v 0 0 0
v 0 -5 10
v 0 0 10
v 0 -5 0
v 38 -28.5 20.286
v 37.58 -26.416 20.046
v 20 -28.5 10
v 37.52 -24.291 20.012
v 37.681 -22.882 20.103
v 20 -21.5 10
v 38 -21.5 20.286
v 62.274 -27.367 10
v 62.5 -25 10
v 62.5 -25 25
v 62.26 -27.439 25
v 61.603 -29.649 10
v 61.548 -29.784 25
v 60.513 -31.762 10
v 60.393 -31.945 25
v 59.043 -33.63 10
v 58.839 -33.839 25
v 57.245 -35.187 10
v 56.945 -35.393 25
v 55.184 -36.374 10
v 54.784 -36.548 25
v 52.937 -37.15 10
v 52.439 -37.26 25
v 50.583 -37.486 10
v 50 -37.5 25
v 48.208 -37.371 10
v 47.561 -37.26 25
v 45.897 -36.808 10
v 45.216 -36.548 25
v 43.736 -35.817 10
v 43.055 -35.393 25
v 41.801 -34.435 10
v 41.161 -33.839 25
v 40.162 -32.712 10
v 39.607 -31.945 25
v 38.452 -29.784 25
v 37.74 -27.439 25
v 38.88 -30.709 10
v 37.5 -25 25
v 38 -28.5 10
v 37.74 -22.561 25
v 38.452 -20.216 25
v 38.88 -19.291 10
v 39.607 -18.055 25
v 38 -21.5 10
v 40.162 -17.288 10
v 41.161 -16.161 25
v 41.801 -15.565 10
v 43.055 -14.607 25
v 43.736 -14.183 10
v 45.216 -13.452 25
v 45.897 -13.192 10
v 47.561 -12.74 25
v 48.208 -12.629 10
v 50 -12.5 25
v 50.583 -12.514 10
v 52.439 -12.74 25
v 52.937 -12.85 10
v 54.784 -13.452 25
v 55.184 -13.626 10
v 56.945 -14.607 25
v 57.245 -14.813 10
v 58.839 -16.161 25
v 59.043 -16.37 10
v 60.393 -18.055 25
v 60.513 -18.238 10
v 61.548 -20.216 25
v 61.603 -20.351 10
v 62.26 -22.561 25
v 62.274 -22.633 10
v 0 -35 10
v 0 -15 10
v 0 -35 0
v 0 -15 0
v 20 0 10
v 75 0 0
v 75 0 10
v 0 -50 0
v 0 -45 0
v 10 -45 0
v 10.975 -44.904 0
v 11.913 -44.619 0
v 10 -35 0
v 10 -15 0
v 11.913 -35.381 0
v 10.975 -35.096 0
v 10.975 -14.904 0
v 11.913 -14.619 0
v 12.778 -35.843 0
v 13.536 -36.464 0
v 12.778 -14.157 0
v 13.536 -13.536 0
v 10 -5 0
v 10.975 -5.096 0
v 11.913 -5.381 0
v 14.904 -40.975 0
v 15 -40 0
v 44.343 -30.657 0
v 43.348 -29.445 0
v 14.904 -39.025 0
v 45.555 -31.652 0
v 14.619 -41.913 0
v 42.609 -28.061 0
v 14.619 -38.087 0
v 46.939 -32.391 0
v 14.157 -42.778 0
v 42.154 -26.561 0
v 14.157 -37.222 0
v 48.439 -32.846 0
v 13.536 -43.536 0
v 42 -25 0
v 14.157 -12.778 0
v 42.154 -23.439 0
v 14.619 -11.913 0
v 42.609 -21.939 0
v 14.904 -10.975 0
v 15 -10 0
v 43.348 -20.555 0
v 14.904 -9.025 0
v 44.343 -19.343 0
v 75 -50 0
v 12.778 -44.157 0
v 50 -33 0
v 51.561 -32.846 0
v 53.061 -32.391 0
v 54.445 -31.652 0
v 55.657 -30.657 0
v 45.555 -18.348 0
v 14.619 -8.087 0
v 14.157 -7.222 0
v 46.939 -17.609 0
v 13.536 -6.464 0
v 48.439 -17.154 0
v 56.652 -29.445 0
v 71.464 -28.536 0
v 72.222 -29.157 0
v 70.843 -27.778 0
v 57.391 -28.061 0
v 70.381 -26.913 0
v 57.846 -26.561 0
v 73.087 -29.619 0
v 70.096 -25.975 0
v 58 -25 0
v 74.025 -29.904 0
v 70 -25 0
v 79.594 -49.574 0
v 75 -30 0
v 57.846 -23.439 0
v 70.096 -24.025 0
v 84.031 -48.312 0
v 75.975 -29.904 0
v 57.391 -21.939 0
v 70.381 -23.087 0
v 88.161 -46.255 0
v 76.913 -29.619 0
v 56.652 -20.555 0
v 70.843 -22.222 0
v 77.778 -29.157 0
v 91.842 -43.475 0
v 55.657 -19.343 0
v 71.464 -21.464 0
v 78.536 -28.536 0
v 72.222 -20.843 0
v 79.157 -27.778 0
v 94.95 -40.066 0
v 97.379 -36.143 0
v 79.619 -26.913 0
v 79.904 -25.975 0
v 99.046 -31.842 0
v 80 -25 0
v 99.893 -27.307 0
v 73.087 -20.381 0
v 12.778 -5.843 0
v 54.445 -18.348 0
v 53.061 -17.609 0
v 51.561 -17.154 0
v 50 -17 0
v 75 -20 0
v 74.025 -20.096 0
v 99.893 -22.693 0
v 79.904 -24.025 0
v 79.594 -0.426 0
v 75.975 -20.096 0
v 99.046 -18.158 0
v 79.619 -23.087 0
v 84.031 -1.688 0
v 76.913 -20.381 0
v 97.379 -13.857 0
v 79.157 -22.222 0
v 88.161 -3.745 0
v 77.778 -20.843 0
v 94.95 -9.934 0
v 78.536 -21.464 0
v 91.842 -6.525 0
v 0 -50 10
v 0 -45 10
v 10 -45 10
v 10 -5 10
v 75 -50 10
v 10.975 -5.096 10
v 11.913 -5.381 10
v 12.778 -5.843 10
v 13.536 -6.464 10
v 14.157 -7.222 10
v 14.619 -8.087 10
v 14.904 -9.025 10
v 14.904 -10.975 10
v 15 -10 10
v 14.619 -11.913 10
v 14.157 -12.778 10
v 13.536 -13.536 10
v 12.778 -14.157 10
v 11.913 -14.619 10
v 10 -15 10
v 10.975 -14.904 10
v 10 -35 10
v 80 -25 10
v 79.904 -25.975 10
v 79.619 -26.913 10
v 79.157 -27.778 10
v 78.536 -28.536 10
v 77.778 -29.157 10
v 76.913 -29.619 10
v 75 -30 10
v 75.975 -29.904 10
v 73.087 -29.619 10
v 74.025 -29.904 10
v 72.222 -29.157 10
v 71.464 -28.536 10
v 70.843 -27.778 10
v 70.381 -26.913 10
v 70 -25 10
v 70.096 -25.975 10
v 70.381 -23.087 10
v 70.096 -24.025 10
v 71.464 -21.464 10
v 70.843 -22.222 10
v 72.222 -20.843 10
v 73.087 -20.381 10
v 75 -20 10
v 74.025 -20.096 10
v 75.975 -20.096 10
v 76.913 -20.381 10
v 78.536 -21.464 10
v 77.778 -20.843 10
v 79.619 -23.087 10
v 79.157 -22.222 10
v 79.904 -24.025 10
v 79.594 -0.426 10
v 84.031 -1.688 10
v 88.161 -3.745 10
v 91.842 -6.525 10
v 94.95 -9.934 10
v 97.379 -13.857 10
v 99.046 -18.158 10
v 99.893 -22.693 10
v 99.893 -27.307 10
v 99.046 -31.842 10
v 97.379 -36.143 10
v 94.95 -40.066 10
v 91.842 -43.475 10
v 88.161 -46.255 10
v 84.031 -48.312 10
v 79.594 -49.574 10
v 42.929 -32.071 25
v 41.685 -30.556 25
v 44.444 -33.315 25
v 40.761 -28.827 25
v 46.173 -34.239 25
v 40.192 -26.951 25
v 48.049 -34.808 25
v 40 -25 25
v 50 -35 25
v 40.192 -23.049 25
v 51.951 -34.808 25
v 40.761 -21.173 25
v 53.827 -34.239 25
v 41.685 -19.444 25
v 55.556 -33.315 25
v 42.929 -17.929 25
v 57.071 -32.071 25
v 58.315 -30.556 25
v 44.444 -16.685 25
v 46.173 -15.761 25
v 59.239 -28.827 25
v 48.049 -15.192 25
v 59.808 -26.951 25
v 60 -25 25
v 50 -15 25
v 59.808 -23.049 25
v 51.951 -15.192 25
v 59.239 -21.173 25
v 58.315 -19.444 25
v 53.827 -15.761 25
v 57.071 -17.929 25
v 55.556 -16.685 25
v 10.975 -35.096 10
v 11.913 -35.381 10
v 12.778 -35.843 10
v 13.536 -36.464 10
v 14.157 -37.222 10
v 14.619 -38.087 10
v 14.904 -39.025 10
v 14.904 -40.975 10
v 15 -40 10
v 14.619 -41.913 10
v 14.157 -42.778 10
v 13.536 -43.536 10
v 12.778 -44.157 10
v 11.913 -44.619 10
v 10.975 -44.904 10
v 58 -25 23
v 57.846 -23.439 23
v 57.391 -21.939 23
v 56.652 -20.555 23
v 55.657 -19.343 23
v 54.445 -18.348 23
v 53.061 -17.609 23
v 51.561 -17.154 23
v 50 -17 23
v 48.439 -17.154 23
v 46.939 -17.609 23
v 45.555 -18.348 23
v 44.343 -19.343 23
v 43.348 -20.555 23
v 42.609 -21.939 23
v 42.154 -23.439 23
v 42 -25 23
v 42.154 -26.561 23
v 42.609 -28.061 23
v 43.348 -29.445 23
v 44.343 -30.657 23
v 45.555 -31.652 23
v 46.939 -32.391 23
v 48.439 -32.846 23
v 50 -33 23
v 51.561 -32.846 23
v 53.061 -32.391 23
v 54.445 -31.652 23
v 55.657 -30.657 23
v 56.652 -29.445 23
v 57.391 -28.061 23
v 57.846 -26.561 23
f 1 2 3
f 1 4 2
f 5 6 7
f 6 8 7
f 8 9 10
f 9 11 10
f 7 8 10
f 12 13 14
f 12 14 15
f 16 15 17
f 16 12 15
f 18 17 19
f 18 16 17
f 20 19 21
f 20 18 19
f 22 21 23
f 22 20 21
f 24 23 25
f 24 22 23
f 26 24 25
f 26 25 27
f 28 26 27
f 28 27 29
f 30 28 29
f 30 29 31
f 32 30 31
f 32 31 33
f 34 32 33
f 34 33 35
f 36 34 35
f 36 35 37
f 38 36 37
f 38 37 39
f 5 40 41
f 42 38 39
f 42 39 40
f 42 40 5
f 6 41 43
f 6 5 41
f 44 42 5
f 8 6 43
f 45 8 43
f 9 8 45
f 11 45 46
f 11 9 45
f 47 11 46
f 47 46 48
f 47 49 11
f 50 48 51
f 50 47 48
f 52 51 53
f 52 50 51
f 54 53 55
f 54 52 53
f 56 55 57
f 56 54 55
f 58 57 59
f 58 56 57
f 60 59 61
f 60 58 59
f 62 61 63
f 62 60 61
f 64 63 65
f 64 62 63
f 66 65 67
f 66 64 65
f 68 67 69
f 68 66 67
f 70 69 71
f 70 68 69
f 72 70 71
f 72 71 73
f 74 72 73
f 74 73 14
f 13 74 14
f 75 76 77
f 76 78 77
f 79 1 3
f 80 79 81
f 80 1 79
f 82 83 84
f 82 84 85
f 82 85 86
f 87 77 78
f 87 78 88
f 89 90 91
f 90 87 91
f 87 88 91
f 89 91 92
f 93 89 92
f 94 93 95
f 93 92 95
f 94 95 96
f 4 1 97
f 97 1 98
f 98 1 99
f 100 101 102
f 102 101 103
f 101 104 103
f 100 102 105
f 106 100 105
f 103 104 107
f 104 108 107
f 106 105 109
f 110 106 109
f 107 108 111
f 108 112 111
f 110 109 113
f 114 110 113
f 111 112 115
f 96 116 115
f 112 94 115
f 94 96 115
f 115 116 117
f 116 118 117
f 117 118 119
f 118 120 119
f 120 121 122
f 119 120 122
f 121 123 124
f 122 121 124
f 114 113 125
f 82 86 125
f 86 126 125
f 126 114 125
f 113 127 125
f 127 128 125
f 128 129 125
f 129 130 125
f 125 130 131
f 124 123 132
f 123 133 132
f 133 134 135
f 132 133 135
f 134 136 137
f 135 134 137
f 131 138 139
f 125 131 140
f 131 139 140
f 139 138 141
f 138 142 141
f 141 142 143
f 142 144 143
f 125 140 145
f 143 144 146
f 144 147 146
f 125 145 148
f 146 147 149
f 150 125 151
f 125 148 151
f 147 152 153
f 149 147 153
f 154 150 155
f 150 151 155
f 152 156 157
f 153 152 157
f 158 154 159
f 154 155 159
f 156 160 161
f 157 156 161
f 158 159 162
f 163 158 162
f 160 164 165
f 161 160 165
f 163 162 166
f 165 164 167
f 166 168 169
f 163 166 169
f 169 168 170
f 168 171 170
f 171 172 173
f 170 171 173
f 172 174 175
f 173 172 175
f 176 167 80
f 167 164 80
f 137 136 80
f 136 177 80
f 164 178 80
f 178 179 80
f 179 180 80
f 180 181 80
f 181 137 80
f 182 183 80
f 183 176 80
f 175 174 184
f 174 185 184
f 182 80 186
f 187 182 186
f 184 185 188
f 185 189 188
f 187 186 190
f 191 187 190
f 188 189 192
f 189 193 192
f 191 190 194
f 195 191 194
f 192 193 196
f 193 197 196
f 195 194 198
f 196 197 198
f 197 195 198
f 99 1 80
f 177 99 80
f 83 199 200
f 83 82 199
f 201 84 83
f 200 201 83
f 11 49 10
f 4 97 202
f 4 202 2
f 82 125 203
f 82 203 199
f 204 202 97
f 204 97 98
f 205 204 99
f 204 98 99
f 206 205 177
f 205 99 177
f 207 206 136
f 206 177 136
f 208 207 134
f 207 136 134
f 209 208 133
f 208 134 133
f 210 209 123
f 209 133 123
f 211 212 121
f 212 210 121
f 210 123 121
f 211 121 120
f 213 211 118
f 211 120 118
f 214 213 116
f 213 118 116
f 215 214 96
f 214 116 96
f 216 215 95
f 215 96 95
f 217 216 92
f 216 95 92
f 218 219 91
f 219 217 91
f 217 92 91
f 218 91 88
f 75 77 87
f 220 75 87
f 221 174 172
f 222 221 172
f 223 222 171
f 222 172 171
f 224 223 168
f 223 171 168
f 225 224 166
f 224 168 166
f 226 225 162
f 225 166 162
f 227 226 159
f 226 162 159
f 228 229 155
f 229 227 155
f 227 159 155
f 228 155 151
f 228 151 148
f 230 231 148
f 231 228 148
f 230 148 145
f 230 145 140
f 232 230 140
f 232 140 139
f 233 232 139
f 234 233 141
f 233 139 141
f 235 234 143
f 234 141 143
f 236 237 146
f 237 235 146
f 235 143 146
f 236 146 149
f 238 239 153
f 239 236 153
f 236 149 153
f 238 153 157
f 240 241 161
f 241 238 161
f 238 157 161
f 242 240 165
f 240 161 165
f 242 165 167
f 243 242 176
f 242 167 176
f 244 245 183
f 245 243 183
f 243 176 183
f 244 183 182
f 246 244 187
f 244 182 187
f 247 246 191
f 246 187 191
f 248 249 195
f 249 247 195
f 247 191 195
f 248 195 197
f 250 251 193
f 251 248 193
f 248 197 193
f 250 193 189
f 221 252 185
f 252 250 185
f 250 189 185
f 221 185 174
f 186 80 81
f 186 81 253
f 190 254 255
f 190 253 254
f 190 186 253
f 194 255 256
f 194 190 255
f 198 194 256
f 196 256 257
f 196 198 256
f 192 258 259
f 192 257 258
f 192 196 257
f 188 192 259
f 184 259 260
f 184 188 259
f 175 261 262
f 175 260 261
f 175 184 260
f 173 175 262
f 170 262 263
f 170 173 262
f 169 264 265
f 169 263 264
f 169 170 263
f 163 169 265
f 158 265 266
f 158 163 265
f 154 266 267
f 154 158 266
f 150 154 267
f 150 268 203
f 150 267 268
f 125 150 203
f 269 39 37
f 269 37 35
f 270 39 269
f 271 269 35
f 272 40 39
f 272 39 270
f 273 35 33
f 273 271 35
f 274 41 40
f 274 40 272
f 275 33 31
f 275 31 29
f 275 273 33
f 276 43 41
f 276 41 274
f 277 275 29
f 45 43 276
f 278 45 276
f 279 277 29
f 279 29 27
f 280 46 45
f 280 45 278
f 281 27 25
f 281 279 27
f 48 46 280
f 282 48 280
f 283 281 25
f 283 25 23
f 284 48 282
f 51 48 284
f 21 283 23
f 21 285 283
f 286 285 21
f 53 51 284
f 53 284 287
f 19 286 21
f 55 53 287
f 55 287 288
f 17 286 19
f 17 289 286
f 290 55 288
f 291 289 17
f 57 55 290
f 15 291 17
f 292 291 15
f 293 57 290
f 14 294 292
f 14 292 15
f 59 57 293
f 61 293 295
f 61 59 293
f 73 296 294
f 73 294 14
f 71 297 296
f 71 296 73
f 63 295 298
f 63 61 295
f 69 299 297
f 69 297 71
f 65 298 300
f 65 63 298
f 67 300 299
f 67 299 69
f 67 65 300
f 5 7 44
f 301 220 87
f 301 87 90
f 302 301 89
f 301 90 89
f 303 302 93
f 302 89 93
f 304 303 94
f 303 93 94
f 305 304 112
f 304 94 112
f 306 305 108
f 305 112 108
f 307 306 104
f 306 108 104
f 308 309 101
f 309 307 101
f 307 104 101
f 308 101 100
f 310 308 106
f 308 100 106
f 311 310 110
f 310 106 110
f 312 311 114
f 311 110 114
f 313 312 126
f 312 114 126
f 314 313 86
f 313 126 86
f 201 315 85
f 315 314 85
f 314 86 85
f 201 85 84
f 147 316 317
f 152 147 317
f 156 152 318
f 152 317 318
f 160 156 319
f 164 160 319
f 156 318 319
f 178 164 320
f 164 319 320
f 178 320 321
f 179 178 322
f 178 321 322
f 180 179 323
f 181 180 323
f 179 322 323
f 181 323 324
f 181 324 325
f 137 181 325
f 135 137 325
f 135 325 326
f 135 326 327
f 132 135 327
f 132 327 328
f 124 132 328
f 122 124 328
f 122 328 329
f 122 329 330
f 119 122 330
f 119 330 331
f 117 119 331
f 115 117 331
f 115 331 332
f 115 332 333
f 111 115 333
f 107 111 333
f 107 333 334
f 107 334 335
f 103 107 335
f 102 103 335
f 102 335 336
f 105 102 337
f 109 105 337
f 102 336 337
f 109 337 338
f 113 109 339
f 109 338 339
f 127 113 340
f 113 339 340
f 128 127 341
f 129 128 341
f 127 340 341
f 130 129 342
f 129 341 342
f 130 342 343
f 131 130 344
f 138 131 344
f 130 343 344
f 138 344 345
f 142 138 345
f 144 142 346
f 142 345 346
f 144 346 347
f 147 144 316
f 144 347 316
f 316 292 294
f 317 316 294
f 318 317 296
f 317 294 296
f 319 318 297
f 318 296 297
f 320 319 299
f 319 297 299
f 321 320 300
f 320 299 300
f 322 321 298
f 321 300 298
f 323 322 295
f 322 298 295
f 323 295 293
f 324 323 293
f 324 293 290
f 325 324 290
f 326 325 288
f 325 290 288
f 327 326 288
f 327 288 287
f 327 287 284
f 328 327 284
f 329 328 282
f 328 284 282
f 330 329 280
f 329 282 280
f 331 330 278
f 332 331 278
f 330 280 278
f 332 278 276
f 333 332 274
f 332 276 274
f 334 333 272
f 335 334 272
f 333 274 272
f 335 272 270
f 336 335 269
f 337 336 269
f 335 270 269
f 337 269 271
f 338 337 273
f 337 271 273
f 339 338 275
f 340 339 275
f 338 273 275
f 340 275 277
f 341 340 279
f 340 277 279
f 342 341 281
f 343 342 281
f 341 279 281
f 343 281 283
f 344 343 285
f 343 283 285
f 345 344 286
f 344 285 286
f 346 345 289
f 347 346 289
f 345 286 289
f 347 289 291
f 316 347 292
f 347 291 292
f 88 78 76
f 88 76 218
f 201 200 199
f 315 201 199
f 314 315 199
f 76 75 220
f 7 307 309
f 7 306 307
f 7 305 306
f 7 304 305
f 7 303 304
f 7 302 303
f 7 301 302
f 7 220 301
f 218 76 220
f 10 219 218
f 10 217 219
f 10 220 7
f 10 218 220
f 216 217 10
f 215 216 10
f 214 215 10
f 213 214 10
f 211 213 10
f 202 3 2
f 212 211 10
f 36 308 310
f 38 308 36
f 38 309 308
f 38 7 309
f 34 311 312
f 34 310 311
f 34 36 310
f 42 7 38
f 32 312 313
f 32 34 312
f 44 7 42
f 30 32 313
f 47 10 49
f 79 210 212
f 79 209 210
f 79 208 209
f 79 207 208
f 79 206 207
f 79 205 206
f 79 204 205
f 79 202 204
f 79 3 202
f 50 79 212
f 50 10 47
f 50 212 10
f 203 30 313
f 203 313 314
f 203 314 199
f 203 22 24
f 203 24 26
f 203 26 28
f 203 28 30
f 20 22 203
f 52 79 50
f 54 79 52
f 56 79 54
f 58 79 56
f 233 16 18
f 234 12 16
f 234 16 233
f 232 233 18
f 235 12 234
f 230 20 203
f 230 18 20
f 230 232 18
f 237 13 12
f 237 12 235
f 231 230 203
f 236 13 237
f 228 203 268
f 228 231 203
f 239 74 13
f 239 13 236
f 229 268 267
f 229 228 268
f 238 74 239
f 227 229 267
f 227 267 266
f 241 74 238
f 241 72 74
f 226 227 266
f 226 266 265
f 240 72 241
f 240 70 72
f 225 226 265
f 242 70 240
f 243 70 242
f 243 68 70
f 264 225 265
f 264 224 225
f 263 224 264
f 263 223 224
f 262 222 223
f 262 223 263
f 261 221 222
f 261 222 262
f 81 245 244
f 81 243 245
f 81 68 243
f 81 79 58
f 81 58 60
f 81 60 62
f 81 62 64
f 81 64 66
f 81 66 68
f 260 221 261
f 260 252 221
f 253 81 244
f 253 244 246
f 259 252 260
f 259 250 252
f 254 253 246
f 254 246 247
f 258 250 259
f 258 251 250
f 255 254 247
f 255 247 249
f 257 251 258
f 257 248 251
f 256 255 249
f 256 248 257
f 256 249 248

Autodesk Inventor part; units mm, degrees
ref_plane "YZ Plane" through (0, 0, 0) normal (1, 0, 0) x (0, 1, 0)
sketch "Эскиз1" plane through (0, 0, 0) normal (0, 0, 1) x (1, 0, 0)
  line L0 (0, 0) -> (75, 0)
  line L1 (75, -50) -> (0, -50)
  line L2 (0, -50) -> (0, -45)
  arc A0 (75, -50) -> (75, 0) centre (75, -25) ccw
  line L3 (0, -25) -> (0, -15)
  line L4 (0, -15) -> (0, -35)
  line L5 (0, -35) -> (10, -35)
  line L6 (10, -45) -> (0, -45)
  line L7 (0, -15) -> (10, -15)
  line L8 (10, -5) -> (0, -5)
  arc A1 (10, -15) -> (10, -5) centre (10, -10) ccw
  arc A2 (10, -45) -> (10, -35) centre (10, -40) ccw
  line L9 (0, -5) -> (0, 0)
  line L10 (0, -35) -> (0, -15)
  circle A3 centre (50, -25) radius 12.5
  circle A4 centre (75, -25) radius 5
  line L11 (20, -25) -> (20, -21.5)
  line L12 (20, -21.5) -> (20, -28.5)
  line L13 (20, -28.5) -> (38, -28.5)
  line L14 (20, -21.5) -> (38, -21.5)
sketch "Эскиз2" plane through (0, 0, 0) normal (0, 1, 0) x (-1, 0, 0)
  point P0 (0, 0)
sketch "Эскиз3" plane through (0, 0, 0) normal (0, 1, 0) x (-1, 0, 0)
  line L0 (0, 0) -> (0, 10)
  line L1 (0, 10) -> (-20, 10)
  line L2 (-20, 10) -> (-37.5, 10)
  line L3 (-37.5, 10) -> (-37.5, 20)
  line L4 (-37.5, 20) -> (-20, 10)
  line L5 (-44.031, 23.732) -> (-37.5, 20)
  line L6 (-44.031, 23.732) -> (-44.031, 33.732)
  line L7 (-44.031, 33.732) -> (-20, 33.732)
  line L8 (-20, 33.732) -> (-20, 10)
  dimension "d24" = 10
  dimension "d25" = 20
  dimension "d26" = 17.5
  dimension "d27" = 10
  dimension "d28" = 10
sketch "Эскиз4" plane through (0, 0, 0) normal (0, 1, 0) x (-1, 0, 0)
  point P0 (0, 0)
ref_plane "РабПлоскость1" through (0, 0, 0) normal (0, 0, 1) x (1, 0, 0)
sketch "Эскиз5" plane through (0, 0, 0) normal (0, 0, 1) x (1, 0, 0)
  circle A0 centre (50, -25) radius 12.5
  point P0 (0, 0)
ref_plane "РабПлоскость2" through (0, 0, 0) normal (0, 0, 1) x (1, 0, 0)
sketch "Эскиз6" plane through (0, 0, 0) normal (0, 0, 1) x (1, 0, 0)
  line L0 (20, -21.5) -> (20, -28.5)
  line L1 (20, -28.5) -> (39.2288, -28.5)
  line L2 (39.2288, -28.5) -> (39.2288, -21.5)
  line L3 (39.2288, -21.5) -> (20, -21.5)
  point P0 (0, 0)
extrude "Выдавливание1" add sketch "Эскиз1" along normal blind 10
extrude "Выдавливание2" add sketch "Эскиз6" along normal blind 25
extrude "Выдавливание3" cut sketch "Эскиз3" against normal blind 35 contours L4 L5 L6 L7 L8
ref_plane "РабПлоскость3" through (0, 0, 0) normal (0, 0, 1) x (1, 0, 0)
sketch "Эскиз7" plane through (0, 0, 0) normal (0, 0, 1) x (1, 0, 0)
  circle A0 centre (50, -25) radius 12.5
  point P0 (0, 0)
extrude "Выдавливание4" cut sketch "Эскиз7" along normal blind 25
extrude "Выдавливание5" add sketch "Эскиз5" along normal blind 25
ref_plane "РабПлоскость4" through (0, 0, 40) normal (0, 0, 1) x (1, 0, 0)
sketch "Эскиз8" plane through (0, 0, 40) normal (0, 0, 1) x (1, 0, 0)
  circle A0 centre (50, -25) radius 8
  point P0 (0, 0)
extrude "Выдавливание6" cut sketch "Эскиз8" against normal blind 70
thread "Резьба1" size "M16x1.5" class "6H" standard "ANSI Metric M Profile" full length
chamfer "Фаска1" distance 2 angle 45 1 edges at (42, -25, 25)
